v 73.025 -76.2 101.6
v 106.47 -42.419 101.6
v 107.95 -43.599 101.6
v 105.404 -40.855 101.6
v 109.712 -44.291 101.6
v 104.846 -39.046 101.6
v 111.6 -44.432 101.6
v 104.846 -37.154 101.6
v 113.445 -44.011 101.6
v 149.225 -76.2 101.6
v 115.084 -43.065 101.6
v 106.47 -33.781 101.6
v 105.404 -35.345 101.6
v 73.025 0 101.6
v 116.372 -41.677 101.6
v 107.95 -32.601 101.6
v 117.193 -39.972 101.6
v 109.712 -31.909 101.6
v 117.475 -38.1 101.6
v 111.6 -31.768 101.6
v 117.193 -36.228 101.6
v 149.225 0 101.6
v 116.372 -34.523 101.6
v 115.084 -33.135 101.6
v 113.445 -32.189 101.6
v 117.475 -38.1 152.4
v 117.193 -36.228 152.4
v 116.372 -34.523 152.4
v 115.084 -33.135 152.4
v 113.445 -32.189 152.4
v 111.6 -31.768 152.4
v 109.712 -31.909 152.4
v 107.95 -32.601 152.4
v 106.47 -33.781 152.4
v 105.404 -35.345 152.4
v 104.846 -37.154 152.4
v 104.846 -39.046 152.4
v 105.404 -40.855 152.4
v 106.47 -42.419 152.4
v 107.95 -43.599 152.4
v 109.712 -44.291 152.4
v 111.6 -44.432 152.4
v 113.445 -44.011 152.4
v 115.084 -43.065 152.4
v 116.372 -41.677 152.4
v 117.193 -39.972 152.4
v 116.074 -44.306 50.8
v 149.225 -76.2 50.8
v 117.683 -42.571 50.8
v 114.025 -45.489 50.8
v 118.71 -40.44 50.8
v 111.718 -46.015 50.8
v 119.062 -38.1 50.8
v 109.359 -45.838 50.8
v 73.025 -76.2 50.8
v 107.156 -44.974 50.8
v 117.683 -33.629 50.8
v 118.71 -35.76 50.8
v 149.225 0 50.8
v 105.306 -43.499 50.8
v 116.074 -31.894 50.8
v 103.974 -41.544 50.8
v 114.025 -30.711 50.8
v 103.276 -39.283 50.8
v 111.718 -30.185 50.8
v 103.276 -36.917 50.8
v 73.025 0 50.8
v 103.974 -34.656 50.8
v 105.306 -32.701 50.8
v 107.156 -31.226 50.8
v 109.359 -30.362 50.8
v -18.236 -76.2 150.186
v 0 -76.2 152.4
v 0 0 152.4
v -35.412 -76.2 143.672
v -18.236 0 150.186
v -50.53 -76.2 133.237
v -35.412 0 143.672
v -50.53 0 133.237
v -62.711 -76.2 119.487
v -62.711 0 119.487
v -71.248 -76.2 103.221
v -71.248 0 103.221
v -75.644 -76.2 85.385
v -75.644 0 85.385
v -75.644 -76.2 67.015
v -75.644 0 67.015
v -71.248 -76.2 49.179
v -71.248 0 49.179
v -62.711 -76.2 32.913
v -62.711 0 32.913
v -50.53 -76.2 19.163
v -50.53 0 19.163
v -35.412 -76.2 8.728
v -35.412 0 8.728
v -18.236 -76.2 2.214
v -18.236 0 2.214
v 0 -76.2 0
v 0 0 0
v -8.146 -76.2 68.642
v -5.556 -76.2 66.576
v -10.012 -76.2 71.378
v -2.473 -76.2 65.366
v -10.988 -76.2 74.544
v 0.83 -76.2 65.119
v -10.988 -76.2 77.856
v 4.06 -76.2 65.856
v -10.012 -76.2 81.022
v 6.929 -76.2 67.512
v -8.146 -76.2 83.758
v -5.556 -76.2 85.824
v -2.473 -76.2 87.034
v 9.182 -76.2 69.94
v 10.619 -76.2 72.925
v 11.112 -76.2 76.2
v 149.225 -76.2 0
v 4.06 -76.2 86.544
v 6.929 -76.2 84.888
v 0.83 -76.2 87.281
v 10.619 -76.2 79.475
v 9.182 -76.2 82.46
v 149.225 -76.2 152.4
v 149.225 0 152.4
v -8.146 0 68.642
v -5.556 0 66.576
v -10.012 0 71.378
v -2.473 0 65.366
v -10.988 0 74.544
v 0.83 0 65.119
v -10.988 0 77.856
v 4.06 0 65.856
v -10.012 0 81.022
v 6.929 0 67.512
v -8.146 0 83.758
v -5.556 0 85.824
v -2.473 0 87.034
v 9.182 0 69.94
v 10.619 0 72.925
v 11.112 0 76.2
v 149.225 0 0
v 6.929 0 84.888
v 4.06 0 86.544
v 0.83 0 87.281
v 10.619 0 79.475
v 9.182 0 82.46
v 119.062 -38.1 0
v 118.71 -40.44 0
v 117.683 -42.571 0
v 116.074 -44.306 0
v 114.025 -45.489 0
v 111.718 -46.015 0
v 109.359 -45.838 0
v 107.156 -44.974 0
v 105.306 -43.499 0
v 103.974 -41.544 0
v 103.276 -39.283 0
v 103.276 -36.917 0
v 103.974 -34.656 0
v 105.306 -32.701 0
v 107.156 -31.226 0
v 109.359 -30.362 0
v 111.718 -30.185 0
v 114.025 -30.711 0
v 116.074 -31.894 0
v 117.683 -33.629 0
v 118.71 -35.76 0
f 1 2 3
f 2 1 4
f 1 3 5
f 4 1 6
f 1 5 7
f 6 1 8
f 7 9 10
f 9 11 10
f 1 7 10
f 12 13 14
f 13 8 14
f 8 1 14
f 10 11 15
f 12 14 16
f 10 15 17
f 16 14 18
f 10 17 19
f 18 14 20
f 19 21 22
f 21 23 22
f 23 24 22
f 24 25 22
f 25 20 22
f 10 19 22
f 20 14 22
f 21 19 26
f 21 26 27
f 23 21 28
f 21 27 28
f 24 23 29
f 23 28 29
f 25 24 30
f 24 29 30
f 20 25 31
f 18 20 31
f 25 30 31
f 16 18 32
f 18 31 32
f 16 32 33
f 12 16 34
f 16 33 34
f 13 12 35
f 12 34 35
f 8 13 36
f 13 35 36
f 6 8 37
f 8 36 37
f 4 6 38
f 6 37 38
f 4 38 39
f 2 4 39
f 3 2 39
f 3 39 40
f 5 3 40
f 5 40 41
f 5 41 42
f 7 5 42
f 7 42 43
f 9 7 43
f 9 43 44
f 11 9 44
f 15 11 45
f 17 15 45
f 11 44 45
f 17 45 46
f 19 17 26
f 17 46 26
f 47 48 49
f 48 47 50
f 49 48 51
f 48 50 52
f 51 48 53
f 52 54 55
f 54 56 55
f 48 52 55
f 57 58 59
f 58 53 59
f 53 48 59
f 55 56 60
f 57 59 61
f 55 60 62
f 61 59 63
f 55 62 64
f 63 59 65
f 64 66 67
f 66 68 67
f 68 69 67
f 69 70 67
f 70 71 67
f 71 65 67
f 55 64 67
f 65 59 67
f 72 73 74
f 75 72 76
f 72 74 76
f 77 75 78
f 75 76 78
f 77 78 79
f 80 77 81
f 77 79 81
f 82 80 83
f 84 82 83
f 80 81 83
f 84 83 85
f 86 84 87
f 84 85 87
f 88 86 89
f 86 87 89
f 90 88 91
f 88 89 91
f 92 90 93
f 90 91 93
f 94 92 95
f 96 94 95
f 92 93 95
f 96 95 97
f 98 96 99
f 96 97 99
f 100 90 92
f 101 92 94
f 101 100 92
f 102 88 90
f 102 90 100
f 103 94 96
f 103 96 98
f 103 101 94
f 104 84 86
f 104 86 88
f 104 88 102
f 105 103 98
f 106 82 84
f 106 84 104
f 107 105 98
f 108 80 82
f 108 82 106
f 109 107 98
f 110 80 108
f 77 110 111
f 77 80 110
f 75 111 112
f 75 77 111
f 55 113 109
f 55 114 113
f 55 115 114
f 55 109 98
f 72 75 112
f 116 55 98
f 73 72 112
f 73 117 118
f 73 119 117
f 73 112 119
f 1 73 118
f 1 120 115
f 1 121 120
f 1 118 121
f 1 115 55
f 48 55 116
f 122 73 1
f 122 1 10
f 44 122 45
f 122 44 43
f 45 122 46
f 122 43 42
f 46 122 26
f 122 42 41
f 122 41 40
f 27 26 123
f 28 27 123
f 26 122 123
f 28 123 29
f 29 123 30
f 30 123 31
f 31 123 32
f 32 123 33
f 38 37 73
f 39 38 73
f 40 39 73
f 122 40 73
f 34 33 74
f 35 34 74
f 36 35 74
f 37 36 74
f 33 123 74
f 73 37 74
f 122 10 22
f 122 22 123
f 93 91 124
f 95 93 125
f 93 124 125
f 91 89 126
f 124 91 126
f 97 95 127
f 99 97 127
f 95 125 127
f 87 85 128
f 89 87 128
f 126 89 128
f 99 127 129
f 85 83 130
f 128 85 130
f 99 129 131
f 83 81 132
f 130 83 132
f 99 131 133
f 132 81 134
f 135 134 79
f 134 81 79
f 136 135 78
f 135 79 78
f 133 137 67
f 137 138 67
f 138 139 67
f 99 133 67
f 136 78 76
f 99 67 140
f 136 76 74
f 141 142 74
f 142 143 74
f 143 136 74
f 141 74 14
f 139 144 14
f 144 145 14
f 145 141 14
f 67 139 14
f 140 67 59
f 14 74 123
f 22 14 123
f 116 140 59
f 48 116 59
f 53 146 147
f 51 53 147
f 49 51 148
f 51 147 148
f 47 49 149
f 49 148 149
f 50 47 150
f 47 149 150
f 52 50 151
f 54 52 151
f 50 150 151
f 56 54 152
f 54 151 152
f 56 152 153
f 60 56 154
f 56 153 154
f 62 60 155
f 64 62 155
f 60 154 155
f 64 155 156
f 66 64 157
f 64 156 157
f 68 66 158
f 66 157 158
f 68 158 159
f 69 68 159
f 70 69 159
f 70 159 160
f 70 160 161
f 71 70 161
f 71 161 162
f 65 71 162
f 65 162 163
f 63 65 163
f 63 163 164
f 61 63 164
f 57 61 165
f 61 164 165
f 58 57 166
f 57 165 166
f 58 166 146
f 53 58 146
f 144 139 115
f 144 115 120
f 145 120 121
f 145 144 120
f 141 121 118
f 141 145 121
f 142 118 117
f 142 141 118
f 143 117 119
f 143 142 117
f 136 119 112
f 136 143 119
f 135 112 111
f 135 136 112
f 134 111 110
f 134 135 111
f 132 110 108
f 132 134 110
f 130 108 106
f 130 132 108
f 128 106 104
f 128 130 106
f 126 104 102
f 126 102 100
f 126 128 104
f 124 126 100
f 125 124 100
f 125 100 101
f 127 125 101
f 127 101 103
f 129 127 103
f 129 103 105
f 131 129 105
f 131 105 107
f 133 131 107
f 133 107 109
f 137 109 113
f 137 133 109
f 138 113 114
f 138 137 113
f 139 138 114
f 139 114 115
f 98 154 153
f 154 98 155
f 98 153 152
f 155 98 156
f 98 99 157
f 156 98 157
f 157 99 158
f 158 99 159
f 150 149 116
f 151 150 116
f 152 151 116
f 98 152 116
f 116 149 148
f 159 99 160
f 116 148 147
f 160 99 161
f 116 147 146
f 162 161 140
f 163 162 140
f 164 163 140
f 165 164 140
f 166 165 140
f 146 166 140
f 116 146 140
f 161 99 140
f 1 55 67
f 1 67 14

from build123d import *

# Parameters (mm, degrees)
F0_R     = 11.1125
F1_DEPTH = 76.2
F3_R     = 7.9375
F4_DEPTH = 50.8
F2_R     = 6.35
F5_DEPTH = 50.8


with BuildPart() as f1:
    # F0 (on Front) → F1 (new body)
    with BuildSketch(Plane.XZ):
        with BuildLine():
            ThreePointArc((0, 152.4), (-76.2, 76.2), (0, 0))
            Line((0, 0), (149.225, 0))
            Line((149.225, 0), (149.225, 50.8))
            Line((149.225, 50.8), (73.025, 50.8))
            Line((73.025, 50.8), (73.025, 101.6))
            Line((73.025, 101.6), (149.225, 101.6))
            Line((149.225, 101.6), (149.225, 152.4))
            Line((149.225, 152.4), (0, 152.4))
        make_face()
        with Locations((0, 76.2)):
            Circle(F0_R, mode=Mode.SUBTRACT)
    extrude(amount=F1_DEPTH)

    # F3 (on face) → F4 (cut)
    with BuildSketch(Plane(origin=(0, 0, 0), x_dir=(1, 0, 0), z_dir=(0, 0, -1))):
        with Locations((111.125, 38.1)):
            Circle(F3_R)
    extrude(amount=-F4_DEPTH, mode=Mode.SUBTRACT)

    # F2 (on face) → F5 (cut)
    with BuildSketch(Plane.XY.offset(152.4)):
        with Locations((111.125, -38.1)):
            Circle(F2_R)
    extrude(amount=-F5_DEPTH, mode=Mode.SUBTRACT)


solid = f1.part
